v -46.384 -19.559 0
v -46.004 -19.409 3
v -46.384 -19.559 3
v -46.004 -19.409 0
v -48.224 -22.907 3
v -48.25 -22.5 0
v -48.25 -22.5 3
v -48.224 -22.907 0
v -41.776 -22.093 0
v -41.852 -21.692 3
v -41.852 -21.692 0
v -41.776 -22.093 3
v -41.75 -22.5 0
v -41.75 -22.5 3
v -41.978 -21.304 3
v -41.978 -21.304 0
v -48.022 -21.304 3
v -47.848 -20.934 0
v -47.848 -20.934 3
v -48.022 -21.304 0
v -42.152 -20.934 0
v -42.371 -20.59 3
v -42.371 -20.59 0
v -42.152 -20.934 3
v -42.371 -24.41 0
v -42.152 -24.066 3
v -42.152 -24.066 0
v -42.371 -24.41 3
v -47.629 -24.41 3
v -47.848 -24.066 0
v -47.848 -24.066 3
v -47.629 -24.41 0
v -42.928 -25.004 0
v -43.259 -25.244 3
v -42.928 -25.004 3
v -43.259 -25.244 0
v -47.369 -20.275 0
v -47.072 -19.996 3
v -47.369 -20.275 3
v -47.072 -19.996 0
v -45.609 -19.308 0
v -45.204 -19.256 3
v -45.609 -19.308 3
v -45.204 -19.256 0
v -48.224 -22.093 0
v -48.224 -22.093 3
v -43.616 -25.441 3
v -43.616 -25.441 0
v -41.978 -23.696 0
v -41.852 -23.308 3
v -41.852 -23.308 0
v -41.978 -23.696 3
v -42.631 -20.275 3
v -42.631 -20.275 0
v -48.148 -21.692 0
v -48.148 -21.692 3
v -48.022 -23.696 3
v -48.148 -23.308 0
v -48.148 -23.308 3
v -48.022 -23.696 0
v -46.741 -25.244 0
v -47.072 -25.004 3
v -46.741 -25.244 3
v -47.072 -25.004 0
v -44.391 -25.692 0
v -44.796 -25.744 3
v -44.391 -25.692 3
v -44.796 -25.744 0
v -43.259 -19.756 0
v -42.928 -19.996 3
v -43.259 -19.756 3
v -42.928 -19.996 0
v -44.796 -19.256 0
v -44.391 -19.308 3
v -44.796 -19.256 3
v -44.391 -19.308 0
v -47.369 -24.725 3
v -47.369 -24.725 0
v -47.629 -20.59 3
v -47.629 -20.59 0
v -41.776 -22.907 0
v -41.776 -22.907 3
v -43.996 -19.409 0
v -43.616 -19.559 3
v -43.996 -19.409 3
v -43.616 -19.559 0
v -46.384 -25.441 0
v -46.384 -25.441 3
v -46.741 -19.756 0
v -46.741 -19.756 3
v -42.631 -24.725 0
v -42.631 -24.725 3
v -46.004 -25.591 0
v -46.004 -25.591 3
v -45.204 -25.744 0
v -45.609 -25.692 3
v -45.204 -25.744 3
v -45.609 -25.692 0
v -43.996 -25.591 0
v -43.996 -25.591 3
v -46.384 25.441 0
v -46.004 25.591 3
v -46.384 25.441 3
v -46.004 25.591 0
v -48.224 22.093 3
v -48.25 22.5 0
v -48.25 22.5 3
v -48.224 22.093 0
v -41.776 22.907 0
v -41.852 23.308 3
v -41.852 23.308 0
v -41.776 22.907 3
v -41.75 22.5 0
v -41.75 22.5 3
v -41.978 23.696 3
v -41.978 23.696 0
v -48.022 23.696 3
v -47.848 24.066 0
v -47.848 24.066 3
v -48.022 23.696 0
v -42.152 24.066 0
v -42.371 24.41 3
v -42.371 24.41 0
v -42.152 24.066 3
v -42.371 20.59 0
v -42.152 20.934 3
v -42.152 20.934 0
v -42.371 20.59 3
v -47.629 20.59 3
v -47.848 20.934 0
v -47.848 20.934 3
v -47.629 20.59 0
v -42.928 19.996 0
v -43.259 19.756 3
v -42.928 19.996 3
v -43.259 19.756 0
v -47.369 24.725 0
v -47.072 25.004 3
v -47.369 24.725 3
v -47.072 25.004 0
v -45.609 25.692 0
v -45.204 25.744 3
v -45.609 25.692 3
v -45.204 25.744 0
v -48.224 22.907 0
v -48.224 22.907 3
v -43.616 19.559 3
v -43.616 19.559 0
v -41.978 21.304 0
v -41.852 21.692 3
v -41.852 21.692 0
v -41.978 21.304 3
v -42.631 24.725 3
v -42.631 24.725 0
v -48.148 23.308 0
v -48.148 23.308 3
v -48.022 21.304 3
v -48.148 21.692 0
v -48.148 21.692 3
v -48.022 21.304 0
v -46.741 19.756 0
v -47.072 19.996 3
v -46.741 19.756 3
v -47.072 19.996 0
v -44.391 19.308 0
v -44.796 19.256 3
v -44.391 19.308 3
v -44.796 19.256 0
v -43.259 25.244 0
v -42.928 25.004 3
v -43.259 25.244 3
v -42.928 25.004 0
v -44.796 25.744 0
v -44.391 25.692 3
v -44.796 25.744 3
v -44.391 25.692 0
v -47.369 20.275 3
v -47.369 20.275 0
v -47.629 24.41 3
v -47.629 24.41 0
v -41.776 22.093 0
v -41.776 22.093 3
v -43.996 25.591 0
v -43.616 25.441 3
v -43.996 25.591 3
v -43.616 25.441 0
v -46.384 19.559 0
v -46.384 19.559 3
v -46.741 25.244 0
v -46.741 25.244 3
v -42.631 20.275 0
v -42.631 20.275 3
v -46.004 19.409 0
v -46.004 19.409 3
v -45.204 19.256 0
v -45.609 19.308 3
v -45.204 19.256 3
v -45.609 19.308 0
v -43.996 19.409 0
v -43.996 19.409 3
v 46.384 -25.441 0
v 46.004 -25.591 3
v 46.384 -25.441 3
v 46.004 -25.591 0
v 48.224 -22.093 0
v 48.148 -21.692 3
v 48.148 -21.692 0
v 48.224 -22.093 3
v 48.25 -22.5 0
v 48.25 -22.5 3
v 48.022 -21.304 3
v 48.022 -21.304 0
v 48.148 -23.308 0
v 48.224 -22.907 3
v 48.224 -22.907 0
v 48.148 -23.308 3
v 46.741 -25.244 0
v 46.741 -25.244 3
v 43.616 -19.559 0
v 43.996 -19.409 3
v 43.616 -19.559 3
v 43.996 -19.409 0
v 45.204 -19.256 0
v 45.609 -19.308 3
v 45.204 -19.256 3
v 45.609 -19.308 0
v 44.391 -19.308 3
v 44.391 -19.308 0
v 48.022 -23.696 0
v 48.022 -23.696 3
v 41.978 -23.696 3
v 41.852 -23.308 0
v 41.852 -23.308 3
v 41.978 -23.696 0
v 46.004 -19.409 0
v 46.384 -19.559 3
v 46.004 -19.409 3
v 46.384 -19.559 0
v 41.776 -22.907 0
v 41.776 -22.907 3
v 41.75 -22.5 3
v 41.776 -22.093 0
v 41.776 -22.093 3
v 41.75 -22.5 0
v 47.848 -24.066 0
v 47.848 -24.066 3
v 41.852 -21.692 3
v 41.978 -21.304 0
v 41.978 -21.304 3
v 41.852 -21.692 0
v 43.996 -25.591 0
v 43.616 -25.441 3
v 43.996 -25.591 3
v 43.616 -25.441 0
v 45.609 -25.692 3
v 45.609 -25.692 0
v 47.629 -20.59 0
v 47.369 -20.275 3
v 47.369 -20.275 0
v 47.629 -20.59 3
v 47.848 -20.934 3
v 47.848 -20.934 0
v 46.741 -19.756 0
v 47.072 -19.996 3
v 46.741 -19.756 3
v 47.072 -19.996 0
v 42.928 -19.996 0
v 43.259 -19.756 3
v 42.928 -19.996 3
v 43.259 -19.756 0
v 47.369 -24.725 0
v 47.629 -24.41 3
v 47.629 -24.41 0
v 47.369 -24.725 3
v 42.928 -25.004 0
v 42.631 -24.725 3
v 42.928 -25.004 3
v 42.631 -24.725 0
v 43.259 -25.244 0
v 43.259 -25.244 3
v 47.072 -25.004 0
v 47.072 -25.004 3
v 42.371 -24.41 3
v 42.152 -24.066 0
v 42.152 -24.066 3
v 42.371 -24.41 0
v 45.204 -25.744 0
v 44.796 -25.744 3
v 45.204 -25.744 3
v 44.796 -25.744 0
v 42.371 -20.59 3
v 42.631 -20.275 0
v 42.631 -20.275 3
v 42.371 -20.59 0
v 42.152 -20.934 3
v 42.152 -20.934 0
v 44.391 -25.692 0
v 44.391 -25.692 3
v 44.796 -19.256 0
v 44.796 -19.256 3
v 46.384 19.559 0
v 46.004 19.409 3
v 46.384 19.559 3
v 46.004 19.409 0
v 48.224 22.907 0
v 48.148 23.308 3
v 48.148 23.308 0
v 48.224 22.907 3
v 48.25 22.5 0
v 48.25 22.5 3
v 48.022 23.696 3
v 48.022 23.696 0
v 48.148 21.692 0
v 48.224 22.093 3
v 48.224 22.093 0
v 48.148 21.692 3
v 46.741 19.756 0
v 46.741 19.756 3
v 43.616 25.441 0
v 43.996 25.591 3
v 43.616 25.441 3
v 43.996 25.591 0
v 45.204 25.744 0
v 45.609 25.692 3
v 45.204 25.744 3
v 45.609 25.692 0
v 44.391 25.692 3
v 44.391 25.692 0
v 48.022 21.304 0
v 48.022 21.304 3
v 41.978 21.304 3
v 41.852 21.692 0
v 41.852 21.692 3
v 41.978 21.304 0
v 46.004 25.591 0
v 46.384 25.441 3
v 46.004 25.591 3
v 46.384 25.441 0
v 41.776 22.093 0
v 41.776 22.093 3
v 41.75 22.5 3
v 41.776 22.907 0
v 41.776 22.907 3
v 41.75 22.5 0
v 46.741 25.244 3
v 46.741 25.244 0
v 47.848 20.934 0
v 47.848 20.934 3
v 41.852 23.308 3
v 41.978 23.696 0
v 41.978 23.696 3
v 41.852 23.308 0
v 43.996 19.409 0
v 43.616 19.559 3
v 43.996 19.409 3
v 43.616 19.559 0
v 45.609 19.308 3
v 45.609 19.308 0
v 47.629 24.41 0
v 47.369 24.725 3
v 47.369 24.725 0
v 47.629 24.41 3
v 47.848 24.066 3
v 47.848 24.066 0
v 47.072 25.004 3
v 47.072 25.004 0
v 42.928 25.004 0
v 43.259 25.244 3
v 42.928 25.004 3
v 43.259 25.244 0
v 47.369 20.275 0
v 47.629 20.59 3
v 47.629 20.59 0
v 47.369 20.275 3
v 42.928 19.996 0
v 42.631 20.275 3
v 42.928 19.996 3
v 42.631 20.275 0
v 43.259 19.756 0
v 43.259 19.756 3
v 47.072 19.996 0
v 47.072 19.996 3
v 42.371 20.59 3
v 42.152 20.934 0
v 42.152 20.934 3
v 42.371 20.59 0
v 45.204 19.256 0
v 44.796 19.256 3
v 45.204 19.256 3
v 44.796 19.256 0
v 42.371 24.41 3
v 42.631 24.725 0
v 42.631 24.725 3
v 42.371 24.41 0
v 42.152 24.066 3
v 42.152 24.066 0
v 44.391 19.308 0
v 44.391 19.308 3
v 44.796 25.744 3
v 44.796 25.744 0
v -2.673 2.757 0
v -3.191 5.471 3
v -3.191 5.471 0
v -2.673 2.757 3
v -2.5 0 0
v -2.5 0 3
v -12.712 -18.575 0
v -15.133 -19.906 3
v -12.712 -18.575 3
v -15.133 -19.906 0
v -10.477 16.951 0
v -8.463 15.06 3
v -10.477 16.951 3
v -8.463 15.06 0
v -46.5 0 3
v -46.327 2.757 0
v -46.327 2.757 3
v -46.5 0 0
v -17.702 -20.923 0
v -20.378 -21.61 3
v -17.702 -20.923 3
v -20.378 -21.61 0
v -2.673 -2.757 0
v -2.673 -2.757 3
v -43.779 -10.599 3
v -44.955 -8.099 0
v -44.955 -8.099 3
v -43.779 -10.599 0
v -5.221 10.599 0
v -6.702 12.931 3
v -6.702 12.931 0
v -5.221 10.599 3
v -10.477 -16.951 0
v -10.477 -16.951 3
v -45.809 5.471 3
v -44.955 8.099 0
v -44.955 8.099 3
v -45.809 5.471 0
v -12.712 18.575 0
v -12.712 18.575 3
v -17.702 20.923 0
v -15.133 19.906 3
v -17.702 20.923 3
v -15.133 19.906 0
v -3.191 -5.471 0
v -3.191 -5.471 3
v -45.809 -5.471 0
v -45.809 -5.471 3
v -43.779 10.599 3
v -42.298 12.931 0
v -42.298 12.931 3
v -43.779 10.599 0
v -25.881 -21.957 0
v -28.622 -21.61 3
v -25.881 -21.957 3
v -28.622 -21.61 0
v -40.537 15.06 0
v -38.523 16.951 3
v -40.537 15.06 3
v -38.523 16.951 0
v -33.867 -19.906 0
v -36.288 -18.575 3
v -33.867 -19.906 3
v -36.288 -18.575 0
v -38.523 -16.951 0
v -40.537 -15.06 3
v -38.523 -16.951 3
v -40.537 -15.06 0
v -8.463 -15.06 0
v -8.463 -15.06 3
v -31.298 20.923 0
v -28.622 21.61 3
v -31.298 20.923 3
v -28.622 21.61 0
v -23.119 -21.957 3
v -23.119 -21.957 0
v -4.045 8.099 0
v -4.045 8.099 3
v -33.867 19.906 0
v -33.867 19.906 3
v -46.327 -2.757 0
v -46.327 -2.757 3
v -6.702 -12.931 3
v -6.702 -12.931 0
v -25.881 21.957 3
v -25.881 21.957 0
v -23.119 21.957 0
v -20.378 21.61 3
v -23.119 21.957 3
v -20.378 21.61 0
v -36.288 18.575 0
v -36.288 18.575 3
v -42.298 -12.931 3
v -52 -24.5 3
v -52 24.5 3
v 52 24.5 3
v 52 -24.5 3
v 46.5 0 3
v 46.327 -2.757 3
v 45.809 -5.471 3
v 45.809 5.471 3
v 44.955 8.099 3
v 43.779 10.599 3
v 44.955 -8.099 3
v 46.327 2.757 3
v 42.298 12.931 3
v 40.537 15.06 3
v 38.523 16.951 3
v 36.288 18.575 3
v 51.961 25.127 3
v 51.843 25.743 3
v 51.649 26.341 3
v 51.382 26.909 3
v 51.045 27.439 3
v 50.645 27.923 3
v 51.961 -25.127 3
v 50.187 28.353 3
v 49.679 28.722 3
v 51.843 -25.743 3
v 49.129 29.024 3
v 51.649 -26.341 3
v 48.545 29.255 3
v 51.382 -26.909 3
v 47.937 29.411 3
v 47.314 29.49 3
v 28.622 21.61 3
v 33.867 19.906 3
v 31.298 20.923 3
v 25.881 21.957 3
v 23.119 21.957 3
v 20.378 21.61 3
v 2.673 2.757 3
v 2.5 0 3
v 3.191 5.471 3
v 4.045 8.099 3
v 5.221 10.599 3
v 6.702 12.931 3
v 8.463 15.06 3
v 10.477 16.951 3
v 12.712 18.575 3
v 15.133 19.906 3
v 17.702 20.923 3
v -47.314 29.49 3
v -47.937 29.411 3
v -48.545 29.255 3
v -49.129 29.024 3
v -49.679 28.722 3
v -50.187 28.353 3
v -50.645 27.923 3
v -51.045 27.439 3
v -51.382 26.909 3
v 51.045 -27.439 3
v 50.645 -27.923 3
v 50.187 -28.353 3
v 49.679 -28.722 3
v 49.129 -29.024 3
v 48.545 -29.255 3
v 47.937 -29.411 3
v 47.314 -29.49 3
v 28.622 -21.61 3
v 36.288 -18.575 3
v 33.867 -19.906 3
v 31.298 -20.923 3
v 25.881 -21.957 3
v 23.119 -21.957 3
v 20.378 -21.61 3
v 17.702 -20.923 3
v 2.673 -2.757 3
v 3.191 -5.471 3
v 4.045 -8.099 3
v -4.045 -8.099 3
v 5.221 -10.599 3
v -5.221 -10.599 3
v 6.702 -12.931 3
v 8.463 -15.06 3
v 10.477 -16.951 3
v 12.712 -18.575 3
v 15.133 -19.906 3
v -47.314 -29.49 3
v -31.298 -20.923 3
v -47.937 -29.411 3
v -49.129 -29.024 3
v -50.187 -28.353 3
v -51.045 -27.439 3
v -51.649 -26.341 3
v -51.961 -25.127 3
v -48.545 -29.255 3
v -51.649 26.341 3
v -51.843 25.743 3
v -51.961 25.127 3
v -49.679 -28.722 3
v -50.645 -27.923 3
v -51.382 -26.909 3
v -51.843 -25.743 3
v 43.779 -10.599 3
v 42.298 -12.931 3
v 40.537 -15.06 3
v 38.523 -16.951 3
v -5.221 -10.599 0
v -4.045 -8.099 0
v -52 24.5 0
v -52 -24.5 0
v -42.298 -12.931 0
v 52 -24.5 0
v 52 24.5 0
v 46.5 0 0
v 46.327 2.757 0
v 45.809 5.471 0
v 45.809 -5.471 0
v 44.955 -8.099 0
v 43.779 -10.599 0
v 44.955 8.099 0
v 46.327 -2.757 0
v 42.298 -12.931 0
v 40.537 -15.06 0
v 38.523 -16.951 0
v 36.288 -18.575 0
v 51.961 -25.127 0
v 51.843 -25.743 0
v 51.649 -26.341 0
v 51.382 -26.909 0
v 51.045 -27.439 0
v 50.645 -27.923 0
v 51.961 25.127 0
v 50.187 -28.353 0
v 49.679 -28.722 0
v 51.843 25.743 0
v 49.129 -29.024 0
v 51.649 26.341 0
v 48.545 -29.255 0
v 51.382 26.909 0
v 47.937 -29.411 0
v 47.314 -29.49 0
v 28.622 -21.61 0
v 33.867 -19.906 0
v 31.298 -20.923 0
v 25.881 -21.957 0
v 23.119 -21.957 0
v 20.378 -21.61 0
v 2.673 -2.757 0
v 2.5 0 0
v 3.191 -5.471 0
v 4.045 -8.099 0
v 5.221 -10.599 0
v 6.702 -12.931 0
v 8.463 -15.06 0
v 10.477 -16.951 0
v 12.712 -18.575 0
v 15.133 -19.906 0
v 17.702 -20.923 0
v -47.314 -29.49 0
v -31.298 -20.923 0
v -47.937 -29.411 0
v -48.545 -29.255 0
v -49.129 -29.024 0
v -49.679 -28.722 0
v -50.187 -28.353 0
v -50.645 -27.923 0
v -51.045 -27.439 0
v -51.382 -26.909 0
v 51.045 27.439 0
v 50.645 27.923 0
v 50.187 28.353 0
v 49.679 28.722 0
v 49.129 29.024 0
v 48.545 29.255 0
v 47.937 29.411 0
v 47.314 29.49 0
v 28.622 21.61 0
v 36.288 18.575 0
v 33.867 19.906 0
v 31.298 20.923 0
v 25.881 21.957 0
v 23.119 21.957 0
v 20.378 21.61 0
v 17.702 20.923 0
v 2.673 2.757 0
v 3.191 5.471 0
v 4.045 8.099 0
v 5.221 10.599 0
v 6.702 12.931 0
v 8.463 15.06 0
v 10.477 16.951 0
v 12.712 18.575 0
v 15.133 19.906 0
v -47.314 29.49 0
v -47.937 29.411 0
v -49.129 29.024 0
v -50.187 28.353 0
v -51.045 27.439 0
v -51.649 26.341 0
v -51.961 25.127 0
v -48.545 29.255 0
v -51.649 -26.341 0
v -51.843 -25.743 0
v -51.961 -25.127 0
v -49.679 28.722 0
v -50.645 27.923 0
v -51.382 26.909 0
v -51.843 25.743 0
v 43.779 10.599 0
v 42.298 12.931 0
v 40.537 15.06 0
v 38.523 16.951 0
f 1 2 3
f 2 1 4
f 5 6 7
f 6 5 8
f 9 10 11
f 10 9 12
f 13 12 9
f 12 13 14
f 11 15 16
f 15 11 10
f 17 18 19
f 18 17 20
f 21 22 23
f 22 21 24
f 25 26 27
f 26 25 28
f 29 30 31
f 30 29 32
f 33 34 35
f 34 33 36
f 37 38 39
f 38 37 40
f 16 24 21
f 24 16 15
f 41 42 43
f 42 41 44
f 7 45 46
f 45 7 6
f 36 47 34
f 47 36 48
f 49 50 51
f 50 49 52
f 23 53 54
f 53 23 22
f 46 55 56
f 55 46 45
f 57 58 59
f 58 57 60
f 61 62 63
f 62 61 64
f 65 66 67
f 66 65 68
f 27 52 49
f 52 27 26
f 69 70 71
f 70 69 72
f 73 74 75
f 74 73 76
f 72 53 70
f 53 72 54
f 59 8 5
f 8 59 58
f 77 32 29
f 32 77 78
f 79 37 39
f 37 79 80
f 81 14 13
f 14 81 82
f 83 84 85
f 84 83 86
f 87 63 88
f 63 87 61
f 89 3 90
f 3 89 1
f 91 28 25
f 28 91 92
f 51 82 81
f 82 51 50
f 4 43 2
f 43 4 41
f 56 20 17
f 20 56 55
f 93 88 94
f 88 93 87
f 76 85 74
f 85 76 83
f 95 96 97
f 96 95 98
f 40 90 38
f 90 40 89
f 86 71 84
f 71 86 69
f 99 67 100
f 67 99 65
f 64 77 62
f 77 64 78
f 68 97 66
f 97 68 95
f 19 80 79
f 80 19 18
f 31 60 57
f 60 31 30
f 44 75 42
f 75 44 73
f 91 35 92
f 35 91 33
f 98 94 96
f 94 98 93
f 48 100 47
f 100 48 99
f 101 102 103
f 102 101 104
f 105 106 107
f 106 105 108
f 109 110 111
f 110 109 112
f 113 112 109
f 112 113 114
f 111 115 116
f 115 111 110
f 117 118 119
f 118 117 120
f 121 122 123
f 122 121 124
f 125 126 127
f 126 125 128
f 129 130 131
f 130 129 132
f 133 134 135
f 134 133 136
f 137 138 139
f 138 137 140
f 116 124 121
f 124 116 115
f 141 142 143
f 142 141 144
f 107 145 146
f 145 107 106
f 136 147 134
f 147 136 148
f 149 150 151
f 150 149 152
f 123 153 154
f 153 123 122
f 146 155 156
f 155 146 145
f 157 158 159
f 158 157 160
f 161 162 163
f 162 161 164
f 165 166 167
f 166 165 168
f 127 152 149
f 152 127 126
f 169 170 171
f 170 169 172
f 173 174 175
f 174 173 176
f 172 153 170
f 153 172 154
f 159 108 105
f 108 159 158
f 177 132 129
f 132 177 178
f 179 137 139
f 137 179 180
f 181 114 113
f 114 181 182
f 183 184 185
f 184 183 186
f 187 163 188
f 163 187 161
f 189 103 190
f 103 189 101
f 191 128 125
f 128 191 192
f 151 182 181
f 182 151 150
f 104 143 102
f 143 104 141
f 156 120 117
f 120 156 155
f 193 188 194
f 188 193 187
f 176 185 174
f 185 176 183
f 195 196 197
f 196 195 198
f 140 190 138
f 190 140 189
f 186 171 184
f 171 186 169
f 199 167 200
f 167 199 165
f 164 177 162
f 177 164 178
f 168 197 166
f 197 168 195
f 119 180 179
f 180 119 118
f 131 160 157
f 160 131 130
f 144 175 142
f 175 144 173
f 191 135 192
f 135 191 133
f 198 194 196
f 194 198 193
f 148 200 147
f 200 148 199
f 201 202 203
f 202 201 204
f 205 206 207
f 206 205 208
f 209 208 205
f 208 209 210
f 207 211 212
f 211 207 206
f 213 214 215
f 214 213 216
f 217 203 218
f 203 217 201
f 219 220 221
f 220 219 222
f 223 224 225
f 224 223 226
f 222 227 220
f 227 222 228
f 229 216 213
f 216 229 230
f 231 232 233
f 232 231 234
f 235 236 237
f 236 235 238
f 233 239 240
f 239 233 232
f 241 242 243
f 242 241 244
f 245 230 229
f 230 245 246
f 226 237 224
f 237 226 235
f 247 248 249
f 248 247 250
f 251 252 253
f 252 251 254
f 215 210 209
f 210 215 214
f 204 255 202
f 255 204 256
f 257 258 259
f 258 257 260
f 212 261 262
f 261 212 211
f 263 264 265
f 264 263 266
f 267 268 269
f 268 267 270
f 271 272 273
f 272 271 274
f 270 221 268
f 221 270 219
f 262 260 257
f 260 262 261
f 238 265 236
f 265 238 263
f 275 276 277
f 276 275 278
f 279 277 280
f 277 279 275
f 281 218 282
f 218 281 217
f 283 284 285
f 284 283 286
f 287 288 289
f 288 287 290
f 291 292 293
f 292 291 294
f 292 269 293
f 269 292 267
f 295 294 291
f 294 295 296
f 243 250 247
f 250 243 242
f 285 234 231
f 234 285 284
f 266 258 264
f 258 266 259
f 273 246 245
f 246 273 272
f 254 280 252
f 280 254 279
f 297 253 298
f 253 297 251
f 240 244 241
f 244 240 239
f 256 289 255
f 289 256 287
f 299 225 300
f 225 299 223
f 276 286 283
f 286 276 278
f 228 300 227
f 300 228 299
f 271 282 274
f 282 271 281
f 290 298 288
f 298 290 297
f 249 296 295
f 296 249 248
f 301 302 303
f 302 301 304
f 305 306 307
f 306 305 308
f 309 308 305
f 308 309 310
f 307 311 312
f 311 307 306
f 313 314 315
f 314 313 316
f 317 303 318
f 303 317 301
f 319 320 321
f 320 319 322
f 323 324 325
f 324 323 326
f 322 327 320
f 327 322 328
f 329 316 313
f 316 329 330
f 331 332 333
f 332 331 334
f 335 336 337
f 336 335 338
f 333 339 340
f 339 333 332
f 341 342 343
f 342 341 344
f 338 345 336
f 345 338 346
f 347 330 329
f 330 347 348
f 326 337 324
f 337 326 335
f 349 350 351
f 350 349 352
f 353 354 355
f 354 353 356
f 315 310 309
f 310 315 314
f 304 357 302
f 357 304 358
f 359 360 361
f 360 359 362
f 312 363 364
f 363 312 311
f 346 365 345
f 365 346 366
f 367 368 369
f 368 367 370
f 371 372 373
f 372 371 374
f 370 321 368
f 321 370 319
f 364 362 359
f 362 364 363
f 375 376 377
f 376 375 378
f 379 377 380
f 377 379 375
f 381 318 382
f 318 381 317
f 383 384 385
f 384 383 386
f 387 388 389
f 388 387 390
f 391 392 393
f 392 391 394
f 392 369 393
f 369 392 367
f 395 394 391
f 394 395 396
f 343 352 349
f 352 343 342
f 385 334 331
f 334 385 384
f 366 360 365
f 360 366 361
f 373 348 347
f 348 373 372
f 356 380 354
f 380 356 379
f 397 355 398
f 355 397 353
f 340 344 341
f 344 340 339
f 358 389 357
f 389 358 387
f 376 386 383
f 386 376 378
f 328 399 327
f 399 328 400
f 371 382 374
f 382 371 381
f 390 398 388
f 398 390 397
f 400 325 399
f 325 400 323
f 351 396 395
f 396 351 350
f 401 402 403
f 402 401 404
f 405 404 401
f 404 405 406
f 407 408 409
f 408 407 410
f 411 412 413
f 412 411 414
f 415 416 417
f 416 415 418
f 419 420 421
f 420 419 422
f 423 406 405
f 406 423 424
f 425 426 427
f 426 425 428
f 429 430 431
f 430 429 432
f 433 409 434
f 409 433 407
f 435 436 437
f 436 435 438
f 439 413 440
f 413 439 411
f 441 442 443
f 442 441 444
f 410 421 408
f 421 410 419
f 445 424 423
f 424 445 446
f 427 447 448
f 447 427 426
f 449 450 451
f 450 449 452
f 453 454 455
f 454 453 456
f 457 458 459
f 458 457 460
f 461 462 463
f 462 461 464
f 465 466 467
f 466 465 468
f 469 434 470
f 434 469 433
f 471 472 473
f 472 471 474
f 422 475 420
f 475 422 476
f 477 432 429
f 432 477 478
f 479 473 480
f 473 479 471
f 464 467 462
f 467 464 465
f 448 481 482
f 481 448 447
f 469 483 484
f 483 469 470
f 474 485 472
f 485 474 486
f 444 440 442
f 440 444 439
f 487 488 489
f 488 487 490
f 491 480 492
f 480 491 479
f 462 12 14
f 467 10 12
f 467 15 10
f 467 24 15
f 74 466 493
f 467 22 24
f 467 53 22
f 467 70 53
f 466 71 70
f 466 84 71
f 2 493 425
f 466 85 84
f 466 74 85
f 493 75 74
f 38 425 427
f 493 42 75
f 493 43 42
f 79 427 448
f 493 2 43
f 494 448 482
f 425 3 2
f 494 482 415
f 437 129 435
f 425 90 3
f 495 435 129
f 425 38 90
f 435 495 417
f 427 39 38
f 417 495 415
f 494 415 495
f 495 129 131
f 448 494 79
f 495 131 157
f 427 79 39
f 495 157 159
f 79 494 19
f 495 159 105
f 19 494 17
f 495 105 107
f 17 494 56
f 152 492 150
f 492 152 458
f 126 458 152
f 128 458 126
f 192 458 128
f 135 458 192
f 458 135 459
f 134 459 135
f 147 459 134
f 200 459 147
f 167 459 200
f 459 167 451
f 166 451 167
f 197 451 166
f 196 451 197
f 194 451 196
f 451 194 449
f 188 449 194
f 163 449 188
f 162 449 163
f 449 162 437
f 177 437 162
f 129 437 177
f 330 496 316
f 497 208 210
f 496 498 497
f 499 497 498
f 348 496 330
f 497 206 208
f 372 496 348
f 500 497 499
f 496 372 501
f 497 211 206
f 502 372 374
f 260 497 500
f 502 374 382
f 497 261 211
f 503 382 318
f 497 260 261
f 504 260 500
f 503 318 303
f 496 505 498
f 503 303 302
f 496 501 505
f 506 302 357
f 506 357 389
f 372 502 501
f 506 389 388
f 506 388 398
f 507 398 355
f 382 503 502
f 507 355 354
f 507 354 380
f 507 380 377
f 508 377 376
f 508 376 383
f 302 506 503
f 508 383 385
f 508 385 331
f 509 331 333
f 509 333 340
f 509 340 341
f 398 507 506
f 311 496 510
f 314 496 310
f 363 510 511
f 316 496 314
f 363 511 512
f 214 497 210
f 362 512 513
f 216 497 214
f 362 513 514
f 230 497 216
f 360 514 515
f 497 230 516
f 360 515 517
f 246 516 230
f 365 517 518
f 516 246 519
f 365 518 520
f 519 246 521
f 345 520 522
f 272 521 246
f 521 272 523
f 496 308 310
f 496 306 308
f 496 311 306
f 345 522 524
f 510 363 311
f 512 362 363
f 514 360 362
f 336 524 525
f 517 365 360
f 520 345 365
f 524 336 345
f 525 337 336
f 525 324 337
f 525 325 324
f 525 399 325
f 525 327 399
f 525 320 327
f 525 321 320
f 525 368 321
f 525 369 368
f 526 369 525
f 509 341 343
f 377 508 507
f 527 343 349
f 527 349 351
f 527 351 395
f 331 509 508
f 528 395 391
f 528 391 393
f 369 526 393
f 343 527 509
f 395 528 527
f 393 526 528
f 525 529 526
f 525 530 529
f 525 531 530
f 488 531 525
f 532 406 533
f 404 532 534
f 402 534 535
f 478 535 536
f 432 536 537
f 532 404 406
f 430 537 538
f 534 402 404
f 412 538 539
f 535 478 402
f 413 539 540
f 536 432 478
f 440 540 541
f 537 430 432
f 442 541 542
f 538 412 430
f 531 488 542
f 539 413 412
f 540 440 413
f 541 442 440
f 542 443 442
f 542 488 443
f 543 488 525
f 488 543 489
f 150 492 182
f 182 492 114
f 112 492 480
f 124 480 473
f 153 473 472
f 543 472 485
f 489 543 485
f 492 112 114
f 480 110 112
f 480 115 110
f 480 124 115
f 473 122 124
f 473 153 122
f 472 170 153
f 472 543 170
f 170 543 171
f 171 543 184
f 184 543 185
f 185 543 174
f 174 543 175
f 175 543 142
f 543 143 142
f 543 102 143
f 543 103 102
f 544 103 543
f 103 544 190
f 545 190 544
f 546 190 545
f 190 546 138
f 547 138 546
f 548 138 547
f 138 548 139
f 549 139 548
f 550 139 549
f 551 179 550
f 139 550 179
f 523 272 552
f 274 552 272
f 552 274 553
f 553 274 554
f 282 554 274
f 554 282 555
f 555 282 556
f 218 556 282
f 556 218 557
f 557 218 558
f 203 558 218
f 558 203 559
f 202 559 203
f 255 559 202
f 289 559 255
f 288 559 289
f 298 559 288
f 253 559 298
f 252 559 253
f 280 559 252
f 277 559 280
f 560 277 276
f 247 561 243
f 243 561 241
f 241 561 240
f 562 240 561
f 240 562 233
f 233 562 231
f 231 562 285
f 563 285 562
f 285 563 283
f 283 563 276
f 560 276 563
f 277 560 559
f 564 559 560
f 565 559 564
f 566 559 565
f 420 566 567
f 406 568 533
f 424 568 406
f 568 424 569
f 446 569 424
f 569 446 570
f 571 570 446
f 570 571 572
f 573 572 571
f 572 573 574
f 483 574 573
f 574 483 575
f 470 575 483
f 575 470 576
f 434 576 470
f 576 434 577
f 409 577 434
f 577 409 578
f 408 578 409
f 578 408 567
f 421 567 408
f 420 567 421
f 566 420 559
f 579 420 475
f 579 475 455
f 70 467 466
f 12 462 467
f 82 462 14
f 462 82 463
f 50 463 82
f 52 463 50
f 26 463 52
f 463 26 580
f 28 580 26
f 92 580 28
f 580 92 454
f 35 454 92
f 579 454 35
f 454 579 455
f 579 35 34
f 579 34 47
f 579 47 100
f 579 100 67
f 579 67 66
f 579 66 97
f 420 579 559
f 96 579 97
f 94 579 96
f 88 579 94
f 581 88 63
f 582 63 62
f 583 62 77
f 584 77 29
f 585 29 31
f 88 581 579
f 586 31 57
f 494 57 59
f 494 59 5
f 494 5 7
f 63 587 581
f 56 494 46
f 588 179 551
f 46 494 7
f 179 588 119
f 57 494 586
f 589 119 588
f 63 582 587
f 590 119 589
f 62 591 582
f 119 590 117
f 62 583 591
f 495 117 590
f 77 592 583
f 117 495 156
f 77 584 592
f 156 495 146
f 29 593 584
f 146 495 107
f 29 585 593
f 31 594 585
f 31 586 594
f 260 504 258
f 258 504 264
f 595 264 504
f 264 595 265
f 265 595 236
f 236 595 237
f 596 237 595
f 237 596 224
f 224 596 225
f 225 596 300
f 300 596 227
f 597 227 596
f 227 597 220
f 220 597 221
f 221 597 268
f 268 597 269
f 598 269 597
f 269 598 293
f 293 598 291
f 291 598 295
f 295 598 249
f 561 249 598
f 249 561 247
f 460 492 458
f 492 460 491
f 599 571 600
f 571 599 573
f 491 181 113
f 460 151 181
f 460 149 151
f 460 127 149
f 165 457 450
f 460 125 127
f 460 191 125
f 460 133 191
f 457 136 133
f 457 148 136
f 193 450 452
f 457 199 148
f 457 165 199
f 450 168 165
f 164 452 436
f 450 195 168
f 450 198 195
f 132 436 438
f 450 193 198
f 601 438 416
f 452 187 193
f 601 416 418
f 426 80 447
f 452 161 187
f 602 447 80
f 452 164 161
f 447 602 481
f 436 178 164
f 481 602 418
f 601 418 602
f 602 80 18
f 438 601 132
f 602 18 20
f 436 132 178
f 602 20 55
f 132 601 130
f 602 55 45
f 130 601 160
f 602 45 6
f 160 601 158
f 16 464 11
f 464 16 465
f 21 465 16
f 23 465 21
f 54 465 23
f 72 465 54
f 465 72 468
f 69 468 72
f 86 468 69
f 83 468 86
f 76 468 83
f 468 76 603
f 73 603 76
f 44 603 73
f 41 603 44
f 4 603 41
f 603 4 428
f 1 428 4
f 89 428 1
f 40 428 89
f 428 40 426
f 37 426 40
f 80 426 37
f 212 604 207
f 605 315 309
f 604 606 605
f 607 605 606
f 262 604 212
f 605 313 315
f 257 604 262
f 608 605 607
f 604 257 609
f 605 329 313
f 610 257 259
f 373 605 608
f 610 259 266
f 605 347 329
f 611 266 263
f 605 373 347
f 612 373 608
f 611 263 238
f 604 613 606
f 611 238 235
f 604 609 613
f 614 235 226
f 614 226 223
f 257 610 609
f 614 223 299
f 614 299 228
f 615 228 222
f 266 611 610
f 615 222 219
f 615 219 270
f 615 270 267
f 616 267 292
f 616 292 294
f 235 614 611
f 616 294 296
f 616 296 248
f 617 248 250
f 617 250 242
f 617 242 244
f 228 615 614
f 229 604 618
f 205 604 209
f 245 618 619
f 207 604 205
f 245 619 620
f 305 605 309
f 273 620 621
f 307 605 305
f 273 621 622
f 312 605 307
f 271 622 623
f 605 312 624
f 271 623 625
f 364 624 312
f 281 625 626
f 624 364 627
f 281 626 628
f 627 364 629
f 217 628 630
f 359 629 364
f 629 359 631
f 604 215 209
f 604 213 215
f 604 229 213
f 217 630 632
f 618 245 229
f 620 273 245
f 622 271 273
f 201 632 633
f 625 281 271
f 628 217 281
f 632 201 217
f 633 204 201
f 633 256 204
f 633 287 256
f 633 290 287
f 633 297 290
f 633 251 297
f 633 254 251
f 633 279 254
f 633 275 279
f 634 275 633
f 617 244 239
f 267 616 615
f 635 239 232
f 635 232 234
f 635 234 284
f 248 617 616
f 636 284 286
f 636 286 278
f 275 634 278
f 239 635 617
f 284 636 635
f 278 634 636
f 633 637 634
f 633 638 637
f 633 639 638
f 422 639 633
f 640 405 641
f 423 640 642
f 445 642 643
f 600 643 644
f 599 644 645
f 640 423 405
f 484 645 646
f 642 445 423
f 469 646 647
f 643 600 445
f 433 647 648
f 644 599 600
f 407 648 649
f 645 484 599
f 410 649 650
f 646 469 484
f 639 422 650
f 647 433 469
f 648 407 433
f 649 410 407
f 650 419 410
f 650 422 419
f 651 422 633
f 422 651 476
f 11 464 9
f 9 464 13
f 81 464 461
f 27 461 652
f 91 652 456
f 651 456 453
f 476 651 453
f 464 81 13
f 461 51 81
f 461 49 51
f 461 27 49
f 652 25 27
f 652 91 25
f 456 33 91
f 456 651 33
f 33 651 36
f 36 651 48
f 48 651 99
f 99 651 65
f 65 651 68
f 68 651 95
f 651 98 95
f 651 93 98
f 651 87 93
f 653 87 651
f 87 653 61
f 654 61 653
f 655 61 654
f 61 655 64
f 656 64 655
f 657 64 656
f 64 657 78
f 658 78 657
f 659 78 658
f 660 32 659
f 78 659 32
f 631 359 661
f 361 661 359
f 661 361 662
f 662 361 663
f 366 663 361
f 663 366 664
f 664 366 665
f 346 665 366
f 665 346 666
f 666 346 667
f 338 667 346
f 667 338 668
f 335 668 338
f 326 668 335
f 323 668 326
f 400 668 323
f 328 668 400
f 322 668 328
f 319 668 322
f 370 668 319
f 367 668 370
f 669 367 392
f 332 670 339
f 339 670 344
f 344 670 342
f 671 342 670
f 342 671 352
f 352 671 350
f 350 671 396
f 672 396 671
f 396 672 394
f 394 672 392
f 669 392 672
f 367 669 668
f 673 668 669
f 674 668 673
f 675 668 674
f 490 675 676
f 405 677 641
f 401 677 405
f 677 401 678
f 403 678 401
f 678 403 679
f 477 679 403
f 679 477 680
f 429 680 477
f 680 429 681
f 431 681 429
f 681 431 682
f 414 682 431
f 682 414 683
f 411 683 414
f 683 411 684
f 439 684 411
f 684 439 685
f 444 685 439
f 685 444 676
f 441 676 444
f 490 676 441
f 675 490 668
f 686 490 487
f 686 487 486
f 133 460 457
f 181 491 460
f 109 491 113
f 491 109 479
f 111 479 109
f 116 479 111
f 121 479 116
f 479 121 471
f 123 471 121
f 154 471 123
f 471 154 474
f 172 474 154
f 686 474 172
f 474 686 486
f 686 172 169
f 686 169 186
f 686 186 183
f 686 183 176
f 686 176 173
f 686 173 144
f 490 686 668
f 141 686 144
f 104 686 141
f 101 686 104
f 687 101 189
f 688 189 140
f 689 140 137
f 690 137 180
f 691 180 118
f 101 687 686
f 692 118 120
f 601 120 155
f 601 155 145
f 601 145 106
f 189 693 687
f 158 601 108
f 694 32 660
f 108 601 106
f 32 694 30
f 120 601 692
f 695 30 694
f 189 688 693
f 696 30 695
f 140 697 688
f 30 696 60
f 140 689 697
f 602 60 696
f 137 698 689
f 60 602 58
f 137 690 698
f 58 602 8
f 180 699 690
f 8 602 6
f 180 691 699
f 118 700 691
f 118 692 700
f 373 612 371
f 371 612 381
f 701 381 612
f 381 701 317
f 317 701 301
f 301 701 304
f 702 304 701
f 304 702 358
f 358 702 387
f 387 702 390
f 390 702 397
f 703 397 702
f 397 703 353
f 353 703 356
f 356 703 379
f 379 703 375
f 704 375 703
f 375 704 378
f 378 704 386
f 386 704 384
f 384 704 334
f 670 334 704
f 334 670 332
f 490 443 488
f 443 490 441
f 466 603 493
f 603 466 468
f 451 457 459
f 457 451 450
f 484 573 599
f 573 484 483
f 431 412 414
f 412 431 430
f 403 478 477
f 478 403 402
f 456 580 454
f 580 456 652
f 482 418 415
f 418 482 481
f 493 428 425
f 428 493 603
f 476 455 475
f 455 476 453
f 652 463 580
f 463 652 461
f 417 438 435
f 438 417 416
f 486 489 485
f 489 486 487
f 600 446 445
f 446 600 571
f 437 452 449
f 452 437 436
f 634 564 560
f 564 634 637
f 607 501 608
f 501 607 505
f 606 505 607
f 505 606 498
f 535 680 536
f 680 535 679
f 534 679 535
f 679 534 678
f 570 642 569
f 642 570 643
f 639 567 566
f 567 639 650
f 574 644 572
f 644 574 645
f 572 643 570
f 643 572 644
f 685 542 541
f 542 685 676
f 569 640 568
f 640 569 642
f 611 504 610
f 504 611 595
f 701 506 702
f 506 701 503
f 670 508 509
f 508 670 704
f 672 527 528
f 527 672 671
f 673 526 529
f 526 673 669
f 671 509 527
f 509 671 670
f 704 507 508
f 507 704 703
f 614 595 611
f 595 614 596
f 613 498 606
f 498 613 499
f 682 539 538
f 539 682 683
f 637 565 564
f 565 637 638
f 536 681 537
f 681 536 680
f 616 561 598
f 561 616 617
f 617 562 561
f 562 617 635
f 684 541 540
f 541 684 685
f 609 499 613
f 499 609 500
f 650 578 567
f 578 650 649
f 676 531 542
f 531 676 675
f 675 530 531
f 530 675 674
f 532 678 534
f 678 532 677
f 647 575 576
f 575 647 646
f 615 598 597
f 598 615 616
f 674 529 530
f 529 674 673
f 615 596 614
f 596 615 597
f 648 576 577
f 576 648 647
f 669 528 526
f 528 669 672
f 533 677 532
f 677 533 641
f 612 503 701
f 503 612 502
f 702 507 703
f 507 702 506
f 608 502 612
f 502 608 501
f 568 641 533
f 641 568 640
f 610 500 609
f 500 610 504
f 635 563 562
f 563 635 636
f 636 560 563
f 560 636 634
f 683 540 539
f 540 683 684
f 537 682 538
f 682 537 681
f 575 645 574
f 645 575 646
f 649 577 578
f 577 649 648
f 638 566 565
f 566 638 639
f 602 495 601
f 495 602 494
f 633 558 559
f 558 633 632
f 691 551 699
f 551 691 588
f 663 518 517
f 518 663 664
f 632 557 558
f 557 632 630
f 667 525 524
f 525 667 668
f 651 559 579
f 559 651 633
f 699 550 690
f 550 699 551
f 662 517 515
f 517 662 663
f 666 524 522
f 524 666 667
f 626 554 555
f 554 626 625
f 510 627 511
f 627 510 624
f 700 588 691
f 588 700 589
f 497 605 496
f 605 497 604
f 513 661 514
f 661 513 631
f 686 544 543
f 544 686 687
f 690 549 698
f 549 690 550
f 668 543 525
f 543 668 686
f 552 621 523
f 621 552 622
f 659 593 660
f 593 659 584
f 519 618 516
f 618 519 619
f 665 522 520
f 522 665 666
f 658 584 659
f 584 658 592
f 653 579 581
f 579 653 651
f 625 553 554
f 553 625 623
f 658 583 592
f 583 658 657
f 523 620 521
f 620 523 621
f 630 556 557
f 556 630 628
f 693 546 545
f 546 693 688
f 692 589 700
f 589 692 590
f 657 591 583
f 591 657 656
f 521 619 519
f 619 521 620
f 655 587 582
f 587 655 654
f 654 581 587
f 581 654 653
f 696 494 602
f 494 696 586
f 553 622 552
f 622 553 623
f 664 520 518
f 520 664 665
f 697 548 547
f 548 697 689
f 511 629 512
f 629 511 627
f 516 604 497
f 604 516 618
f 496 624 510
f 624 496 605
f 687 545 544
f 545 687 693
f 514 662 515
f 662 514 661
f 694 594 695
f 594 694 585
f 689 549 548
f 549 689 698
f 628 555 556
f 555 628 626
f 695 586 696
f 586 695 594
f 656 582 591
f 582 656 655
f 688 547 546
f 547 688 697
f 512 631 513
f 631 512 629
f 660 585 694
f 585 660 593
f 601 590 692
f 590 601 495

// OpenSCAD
$fn = 50;

difference() {
	union() {
		hull() {
			translate(v = [-47.0, 24.5, 0]) {
				cylinder(h = 3, r = 5);
			}
			translate(v = [47.0, 24.5, 0]) {
				cylinder(h = 3, r = 5);
			}
			translate(v = [-47.0, -24.5, 0]) {
				cylinder(h = 3, r = 5);
			}
			translate(v = [47.0, -24.5, 0]) {
				cylinder(h = 3, r = 5);
			}
		}
	}
	union() {
		translate(v = [-45.0, -22.5, -100.0]) {
			cylinder(h = 200, r = 3.25);
		}
		translate(v = [-45.0, 22.5, -100.0]) {
			cylinder(h = 200, r = 3.25);
		}
		translate(v = [45.0, -22.5, -100.0]) {
			cylinder(h = 200, r = 3.25);
		}
		translate(v = [45.0, 22.5, -100.0]) {
			cylinder(h = 200, r = 3.25);
		}
		translate(v = [-45.0, -22.5, -100.0]) {
			cylinder(h = 200, r = 1.8);
		}
		translate(v = [-45.0, 22.5, -100.0]) {
			cylinder(h = 200, r = 1.8);
		}
		translate(v = [45.0, -22.5, -100.0]) {
			cylinder(h = 200, r = 1.8);
		}
		translate(v = [45.0, 22.5, -100.0]) {
			cylinder(h = 200, r = 1.8);
		}
		translate(v = [-24.5, 0, 0.0]) {
			cylinder(h = 3, r = 22.0);
		}
		translate(v = [24.5, 0, 0.0]) {
			cylinder(h = 3, r = 22.0);
		}
	}
}
